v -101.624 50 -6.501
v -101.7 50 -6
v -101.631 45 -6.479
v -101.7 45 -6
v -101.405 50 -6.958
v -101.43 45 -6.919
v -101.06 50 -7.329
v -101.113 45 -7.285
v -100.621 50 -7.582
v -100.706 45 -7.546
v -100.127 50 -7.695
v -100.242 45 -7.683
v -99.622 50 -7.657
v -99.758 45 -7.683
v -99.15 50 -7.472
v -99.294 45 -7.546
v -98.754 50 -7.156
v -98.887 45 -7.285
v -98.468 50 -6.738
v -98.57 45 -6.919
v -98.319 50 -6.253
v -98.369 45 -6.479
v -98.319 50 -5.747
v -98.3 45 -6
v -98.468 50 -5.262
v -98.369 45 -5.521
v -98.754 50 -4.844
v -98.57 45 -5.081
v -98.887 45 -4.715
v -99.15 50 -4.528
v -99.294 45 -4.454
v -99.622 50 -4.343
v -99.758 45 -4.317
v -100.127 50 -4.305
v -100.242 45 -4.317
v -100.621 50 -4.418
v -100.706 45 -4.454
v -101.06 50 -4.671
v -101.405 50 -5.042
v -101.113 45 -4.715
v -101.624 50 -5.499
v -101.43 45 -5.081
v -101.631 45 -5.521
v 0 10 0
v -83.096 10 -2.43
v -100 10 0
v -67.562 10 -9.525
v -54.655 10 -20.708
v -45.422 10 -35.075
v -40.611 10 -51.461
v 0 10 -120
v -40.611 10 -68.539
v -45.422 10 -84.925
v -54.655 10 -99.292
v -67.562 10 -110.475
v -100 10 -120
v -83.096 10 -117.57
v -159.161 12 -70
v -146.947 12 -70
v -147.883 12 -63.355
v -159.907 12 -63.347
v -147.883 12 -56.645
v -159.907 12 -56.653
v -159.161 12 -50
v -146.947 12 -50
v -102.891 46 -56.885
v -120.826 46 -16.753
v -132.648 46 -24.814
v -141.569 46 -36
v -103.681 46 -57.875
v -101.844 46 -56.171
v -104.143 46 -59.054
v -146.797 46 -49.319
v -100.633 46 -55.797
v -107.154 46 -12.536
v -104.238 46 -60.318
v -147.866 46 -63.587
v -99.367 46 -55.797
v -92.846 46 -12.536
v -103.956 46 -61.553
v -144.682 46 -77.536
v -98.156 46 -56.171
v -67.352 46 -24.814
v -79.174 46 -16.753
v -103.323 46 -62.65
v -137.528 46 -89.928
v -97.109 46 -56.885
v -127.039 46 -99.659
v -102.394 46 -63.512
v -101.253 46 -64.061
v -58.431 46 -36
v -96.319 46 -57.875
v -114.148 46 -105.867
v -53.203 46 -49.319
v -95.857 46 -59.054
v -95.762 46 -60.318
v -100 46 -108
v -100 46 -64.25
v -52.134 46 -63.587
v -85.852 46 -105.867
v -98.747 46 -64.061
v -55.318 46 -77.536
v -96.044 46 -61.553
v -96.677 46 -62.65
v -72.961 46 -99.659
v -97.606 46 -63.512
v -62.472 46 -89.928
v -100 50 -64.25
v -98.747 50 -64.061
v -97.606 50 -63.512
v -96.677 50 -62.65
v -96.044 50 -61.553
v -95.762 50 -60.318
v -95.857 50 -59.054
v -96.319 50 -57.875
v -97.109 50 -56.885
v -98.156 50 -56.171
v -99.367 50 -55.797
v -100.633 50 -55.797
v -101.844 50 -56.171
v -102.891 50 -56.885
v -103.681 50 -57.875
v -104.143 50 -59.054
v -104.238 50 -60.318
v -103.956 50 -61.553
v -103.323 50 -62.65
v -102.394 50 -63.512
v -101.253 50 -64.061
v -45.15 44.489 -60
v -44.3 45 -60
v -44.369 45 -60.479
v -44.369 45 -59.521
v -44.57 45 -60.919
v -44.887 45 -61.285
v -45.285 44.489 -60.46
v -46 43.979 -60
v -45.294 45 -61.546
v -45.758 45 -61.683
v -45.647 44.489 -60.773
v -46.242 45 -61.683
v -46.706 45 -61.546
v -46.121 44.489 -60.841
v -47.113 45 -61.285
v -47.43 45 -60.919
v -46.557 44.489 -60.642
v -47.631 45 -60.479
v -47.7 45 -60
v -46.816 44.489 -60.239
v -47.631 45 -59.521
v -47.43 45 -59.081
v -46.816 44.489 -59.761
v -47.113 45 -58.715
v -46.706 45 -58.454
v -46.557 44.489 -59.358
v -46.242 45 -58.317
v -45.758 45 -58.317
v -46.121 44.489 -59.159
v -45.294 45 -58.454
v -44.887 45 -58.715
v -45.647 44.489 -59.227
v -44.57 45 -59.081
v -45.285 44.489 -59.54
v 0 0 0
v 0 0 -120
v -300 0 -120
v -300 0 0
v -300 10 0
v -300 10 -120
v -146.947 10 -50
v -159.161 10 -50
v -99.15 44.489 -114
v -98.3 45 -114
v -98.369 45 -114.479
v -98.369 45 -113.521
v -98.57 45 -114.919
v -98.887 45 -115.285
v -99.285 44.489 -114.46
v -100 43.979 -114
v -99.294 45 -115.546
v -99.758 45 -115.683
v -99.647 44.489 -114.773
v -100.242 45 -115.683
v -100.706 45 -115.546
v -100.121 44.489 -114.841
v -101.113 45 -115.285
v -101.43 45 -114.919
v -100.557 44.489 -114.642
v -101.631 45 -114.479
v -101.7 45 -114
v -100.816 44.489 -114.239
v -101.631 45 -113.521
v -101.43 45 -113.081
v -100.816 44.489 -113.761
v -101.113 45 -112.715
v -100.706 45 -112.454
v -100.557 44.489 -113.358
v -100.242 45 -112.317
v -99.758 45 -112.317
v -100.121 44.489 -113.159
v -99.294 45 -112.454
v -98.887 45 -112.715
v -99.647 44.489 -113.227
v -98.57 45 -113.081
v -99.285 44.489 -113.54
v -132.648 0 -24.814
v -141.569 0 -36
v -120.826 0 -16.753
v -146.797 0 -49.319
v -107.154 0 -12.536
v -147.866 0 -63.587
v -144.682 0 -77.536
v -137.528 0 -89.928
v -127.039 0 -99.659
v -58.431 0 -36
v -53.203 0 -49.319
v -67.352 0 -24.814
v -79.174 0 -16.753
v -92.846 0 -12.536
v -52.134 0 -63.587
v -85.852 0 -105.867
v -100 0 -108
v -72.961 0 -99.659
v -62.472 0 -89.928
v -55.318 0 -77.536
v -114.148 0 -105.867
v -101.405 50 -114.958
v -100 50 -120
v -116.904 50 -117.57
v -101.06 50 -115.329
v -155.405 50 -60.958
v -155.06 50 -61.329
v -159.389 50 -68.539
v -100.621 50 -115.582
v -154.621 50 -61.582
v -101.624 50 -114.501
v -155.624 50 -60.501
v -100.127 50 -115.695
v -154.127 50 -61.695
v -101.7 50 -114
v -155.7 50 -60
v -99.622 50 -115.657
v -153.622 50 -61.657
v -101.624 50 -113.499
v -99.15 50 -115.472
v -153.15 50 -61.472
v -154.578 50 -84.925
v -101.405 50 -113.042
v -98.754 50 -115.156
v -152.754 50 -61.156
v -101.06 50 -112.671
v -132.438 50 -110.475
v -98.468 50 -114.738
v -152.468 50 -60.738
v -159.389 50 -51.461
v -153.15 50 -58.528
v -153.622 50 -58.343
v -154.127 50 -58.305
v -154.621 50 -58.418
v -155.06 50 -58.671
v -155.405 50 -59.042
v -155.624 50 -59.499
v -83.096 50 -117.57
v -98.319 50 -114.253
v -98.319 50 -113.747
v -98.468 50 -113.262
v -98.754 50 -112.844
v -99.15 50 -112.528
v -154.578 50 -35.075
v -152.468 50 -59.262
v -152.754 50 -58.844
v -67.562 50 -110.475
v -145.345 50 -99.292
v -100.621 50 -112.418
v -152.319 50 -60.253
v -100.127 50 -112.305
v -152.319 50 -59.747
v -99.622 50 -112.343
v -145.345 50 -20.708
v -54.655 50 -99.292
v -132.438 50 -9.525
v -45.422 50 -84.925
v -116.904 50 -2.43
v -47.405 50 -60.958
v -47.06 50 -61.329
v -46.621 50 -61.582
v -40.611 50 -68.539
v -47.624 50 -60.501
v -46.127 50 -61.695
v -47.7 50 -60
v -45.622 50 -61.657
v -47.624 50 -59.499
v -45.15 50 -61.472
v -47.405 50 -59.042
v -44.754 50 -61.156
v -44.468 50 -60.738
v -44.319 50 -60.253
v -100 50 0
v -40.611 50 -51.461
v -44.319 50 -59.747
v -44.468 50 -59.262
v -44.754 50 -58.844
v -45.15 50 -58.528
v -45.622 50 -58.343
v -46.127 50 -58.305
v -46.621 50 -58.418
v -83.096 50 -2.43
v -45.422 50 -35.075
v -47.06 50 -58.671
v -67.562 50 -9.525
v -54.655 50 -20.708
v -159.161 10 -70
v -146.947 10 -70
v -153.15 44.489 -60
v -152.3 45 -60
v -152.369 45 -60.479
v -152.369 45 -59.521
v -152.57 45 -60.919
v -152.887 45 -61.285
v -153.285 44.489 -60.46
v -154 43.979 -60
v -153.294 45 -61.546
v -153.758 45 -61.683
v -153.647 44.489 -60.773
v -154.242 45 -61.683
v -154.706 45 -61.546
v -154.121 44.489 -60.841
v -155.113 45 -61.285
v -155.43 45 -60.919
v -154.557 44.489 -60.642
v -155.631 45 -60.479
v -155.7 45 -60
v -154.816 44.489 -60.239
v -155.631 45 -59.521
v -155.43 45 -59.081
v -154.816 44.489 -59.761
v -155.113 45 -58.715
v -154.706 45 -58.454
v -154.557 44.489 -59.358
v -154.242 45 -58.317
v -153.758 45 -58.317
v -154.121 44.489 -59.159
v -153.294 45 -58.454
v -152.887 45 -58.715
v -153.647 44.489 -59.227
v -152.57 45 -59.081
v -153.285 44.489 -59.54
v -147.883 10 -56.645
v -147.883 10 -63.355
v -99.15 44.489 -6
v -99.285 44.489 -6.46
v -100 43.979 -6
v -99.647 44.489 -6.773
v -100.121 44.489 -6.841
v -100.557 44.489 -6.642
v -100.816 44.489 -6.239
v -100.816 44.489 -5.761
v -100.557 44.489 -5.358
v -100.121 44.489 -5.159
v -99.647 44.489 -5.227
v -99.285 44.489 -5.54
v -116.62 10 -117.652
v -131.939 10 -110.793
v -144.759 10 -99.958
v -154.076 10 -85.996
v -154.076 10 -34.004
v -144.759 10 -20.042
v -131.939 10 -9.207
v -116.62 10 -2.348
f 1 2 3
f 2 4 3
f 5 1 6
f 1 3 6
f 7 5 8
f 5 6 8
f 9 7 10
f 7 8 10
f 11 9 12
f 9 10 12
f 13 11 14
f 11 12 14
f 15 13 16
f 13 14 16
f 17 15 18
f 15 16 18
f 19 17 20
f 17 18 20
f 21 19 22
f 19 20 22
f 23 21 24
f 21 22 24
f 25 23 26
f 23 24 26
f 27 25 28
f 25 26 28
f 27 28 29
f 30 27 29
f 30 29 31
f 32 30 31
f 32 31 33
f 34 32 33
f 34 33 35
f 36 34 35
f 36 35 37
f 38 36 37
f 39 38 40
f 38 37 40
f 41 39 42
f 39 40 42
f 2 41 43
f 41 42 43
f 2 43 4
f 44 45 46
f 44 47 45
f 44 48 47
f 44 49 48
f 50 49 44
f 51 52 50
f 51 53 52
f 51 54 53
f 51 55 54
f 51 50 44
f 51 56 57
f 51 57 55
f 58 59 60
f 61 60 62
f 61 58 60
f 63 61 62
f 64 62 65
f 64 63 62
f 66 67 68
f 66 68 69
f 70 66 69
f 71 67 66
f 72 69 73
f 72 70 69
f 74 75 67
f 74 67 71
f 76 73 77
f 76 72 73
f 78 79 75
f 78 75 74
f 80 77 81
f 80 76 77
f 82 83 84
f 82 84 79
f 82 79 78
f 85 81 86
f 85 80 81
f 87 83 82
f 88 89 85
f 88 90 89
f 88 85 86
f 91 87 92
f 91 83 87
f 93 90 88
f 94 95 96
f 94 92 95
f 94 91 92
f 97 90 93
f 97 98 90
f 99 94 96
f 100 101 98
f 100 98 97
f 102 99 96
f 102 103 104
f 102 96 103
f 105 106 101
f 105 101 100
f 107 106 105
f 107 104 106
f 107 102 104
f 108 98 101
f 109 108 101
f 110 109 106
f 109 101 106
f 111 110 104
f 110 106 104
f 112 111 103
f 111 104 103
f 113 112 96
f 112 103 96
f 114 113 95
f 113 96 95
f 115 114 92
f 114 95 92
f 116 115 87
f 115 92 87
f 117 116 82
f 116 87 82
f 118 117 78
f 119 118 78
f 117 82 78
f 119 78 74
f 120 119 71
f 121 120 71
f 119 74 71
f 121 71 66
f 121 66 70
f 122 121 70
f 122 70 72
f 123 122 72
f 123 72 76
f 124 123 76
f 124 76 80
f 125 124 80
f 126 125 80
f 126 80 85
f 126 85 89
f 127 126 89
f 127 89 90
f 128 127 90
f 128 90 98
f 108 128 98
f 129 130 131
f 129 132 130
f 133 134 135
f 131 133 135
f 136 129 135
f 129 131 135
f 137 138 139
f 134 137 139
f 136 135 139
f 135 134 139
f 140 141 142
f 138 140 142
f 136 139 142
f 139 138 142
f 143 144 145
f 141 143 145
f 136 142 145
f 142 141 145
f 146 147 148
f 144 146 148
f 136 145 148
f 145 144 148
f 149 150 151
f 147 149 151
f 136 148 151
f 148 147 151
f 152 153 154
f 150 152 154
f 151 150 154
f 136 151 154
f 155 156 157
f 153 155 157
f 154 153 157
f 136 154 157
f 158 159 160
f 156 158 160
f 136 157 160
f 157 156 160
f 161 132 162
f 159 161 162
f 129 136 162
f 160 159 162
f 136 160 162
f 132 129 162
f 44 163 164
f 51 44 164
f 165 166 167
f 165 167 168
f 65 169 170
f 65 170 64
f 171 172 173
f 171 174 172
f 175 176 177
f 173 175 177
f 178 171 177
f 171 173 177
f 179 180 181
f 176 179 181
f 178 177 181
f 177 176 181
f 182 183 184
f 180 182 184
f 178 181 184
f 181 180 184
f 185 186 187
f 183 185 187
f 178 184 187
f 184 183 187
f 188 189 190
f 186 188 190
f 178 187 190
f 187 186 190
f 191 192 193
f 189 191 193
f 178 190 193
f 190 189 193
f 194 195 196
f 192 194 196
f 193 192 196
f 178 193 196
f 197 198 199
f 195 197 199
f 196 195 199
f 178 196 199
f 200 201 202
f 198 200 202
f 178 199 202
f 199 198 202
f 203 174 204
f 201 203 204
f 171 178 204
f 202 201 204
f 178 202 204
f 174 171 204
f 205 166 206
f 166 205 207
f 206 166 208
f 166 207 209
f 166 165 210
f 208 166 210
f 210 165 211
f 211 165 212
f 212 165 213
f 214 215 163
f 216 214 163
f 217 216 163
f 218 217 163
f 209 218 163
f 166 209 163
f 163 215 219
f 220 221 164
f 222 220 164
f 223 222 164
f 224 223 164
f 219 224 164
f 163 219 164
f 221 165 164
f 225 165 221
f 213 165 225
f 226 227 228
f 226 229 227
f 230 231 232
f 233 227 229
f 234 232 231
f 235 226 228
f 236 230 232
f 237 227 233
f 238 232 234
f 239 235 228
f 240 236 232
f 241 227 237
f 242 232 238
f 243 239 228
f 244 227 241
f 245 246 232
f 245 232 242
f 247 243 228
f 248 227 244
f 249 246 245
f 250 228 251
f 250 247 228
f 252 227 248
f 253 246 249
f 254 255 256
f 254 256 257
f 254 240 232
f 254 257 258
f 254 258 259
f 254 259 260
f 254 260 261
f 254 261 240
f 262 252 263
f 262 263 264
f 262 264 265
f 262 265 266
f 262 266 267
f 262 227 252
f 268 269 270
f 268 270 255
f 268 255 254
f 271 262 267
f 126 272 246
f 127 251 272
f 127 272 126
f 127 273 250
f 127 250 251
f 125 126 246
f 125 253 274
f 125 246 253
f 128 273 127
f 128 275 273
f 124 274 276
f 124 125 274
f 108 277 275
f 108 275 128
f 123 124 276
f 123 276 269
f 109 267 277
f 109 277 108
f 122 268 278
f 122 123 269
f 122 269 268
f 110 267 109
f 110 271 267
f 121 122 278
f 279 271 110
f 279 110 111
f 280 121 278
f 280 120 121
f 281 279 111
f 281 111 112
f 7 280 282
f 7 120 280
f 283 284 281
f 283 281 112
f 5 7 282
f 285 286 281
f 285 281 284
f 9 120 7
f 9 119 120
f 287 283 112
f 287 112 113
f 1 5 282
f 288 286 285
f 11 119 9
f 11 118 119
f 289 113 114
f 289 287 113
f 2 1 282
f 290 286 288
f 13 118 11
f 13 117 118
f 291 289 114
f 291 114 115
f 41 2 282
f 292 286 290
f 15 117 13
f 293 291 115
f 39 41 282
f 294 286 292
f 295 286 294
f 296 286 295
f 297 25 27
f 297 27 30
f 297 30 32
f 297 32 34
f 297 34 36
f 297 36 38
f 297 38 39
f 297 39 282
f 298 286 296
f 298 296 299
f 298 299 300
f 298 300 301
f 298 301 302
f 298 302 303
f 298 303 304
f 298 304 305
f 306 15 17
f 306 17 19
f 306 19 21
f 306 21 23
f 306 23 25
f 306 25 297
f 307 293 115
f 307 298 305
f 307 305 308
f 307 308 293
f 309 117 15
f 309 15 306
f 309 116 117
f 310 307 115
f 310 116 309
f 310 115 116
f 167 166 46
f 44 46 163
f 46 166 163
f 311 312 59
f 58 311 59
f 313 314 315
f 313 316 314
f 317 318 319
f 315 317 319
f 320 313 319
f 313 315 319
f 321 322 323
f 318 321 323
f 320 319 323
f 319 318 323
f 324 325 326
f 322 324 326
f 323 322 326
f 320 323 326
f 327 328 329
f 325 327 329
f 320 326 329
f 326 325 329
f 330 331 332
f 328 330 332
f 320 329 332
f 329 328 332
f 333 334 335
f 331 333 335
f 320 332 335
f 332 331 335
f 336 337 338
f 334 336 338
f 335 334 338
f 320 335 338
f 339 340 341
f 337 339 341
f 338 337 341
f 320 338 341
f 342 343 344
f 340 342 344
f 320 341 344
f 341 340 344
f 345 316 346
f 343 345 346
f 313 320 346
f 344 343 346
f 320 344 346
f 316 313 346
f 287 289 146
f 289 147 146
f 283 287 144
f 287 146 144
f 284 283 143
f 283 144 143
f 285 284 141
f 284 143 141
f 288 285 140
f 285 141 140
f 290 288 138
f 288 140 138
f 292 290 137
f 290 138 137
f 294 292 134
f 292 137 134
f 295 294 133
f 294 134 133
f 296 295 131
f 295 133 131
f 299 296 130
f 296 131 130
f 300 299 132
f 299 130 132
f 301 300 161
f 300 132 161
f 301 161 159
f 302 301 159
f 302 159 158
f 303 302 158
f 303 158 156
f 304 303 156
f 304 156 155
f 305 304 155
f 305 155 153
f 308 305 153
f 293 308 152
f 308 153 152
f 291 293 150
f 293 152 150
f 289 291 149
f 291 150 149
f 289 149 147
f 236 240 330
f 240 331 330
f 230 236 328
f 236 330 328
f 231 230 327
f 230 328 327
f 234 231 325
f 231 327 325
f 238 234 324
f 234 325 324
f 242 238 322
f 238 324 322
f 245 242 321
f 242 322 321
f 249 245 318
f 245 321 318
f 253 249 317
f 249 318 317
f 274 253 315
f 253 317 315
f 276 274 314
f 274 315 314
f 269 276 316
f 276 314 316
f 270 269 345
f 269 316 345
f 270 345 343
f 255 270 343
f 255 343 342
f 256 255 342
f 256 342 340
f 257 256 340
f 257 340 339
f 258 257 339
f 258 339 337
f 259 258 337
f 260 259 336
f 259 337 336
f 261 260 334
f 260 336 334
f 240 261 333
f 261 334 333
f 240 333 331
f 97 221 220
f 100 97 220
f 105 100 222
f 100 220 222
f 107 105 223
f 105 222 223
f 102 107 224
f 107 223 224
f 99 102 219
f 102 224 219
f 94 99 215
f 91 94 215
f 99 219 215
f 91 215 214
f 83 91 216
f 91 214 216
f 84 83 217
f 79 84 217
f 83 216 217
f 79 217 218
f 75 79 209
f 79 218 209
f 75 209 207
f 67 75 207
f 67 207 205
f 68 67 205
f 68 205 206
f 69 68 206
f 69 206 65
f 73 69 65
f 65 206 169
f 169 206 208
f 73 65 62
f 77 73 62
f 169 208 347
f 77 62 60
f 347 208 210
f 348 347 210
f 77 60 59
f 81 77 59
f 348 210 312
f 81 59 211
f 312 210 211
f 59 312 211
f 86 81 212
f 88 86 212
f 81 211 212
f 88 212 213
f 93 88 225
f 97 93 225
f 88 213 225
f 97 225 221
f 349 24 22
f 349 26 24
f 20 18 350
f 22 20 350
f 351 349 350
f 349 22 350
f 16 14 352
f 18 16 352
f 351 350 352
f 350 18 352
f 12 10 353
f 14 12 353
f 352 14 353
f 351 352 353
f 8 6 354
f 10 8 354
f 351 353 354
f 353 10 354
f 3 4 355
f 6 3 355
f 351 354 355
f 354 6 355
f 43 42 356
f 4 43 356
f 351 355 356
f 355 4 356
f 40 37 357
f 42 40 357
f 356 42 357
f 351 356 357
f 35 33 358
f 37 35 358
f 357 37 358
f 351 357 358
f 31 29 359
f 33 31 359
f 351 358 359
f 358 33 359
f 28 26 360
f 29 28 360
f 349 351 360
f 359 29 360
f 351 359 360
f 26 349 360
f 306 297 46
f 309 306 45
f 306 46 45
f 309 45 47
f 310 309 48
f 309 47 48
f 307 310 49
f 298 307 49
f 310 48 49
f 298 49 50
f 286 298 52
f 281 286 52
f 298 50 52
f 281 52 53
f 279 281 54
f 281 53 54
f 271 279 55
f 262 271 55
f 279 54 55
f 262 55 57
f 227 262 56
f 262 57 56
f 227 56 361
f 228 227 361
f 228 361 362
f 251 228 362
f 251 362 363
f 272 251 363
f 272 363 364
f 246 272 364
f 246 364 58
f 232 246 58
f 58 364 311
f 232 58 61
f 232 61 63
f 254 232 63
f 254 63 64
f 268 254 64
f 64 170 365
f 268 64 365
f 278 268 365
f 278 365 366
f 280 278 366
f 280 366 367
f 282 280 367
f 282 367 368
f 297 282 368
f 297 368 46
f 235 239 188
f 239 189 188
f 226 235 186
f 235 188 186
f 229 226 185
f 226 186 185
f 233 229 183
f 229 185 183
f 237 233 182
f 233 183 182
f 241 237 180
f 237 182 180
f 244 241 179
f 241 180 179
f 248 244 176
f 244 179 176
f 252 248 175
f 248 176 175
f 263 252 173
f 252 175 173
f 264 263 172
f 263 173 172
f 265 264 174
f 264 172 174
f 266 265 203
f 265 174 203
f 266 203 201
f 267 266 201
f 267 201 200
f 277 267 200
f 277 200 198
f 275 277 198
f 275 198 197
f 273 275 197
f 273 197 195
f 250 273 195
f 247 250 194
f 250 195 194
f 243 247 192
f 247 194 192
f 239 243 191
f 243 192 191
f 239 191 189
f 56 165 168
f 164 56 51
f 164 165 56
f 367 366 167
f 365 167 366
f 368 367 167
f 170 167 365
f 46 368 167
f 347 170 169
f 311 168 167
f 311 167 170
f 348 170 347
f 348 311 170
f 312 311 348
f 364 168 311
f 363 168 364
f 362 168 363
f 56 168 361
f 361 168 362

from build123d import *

# Parameters (mm, degrees)
SCHIZZO1_W                   = 300
SCHIZZO1_H                   = 120
ESTRUSIONE_ESTRUSIONE1_DEPTH = 10
SCHIZZO4_R                   = 60
ESTRUSIONE_ESTRUSIONE2_DEPTH = 40
SCHIZZO5_R                   = 48
TAGLIO_ESTRUSIONE1_DEPTH     = 46
SCHIZZO6_R                   = 4.25
TAGLIO_ESTRUSIONE2_DEPTH     = 46
SCHIZZO7_W                   = 20
SCHIZZO7_H                   = 2
TAGLIO_ESTRUSIONE3_DEPTH     = 46
FORO_PER_VITE_M3_1_D         = 3.4
FORO_PER_VITE_M3_1_DEPTH     = 5
FORO_PER_VITE_M3_1_TIP       = 1.021463052


with BuildPart() as part:
    # Schizzo1 → Estrusione-Estrusione1 (new body)
    with BuildSketch(Plane(origin=(0, 0, 0), x_dir=(1, 0, 0), z_dir=(0, 1, 0))):
        with Locations((-150, 60)):
            Rectangle(SCHIZZO1_W, SCHIZZO1_H)
    extrude(amount=ESTRUSIONE_ESTRUSIONE1_DEPTH)

    # Schizzo4 → Estrusione-Estrusione2 (add)
    with BuildSketch(Plane(origin=(0, 10, 0), x_dir=(1, 0, 0), z_dir=(0, 1, 0))):
        with Locations(Location((-100, 60, 0), (0, 0, 270))):
            Circle(SCHIZZO4_R)
    extrude(amount=ESTRUSIONE_ESTRUSIONE2_DEPTH)

    # Schizzo5 → Taglio-Estrusione1 (cut)
    with BuildSketch(Plane.XZ):
        with Locations(Location((-100, -60, 0), (0, 0, 270))):
            Circle(SCHIZZO5_R)
    extrude(amount=-TAGLIO_ESTRUSIONE1_DEPTH, mode=Mode.SUBTRACT)

    # Schizzo6 → Taglio-Estrusione2 (cut)
    with BuildSketch(Plane.XZ.offset(-46)):
        with Locations(Location((-100, -60, 0), (0, 0, 270))):
            Circle(SCHIZZO6_R)
    extrude(amount=-TAGLIO_ESTRUSIONE2_DEPTH, mode=Mode.SUBTRACT)

    # Schizzo7 → Taglio-Estrusione3 (cut)
    with BuildSketch(Plane.ZY.offset(160)):
        with Locations((-60, 11)):
            Rectangle(SCHIZZO7_W, SCHIZZO7_H)
    extrude(amount=-TAGLIO_ESTRUSIONE3_DEPTH, mode=Mode.SUBTRACT)

    # Foro per Vite M3-1
    with Locations(Plane(origin=(0, 50, 0), x_dir=(1, 0, 0), z_dir=(0, 1, 0))):
        with Locations((-154, 60), (-100, 114), (-46, 60), (-100, 6)):
            Hole(FORO_PER_VITE_M3_1_D / 2, depth=FORO_PER_VITE_M3_1_DEPTH)
            with Locations((0, 0, -(FORO_PER_VITE_M3_1_DEPTH + FORO_PER_VITE_M3_1_TIP / 2))):  # 118° drill point
                Cone(0, FORO_PER_VITE_M3_1_D / 2, FORO_PER_VITE_M3_1_TIP, mode=Mode.SUBTRACT)


solid = part.part
